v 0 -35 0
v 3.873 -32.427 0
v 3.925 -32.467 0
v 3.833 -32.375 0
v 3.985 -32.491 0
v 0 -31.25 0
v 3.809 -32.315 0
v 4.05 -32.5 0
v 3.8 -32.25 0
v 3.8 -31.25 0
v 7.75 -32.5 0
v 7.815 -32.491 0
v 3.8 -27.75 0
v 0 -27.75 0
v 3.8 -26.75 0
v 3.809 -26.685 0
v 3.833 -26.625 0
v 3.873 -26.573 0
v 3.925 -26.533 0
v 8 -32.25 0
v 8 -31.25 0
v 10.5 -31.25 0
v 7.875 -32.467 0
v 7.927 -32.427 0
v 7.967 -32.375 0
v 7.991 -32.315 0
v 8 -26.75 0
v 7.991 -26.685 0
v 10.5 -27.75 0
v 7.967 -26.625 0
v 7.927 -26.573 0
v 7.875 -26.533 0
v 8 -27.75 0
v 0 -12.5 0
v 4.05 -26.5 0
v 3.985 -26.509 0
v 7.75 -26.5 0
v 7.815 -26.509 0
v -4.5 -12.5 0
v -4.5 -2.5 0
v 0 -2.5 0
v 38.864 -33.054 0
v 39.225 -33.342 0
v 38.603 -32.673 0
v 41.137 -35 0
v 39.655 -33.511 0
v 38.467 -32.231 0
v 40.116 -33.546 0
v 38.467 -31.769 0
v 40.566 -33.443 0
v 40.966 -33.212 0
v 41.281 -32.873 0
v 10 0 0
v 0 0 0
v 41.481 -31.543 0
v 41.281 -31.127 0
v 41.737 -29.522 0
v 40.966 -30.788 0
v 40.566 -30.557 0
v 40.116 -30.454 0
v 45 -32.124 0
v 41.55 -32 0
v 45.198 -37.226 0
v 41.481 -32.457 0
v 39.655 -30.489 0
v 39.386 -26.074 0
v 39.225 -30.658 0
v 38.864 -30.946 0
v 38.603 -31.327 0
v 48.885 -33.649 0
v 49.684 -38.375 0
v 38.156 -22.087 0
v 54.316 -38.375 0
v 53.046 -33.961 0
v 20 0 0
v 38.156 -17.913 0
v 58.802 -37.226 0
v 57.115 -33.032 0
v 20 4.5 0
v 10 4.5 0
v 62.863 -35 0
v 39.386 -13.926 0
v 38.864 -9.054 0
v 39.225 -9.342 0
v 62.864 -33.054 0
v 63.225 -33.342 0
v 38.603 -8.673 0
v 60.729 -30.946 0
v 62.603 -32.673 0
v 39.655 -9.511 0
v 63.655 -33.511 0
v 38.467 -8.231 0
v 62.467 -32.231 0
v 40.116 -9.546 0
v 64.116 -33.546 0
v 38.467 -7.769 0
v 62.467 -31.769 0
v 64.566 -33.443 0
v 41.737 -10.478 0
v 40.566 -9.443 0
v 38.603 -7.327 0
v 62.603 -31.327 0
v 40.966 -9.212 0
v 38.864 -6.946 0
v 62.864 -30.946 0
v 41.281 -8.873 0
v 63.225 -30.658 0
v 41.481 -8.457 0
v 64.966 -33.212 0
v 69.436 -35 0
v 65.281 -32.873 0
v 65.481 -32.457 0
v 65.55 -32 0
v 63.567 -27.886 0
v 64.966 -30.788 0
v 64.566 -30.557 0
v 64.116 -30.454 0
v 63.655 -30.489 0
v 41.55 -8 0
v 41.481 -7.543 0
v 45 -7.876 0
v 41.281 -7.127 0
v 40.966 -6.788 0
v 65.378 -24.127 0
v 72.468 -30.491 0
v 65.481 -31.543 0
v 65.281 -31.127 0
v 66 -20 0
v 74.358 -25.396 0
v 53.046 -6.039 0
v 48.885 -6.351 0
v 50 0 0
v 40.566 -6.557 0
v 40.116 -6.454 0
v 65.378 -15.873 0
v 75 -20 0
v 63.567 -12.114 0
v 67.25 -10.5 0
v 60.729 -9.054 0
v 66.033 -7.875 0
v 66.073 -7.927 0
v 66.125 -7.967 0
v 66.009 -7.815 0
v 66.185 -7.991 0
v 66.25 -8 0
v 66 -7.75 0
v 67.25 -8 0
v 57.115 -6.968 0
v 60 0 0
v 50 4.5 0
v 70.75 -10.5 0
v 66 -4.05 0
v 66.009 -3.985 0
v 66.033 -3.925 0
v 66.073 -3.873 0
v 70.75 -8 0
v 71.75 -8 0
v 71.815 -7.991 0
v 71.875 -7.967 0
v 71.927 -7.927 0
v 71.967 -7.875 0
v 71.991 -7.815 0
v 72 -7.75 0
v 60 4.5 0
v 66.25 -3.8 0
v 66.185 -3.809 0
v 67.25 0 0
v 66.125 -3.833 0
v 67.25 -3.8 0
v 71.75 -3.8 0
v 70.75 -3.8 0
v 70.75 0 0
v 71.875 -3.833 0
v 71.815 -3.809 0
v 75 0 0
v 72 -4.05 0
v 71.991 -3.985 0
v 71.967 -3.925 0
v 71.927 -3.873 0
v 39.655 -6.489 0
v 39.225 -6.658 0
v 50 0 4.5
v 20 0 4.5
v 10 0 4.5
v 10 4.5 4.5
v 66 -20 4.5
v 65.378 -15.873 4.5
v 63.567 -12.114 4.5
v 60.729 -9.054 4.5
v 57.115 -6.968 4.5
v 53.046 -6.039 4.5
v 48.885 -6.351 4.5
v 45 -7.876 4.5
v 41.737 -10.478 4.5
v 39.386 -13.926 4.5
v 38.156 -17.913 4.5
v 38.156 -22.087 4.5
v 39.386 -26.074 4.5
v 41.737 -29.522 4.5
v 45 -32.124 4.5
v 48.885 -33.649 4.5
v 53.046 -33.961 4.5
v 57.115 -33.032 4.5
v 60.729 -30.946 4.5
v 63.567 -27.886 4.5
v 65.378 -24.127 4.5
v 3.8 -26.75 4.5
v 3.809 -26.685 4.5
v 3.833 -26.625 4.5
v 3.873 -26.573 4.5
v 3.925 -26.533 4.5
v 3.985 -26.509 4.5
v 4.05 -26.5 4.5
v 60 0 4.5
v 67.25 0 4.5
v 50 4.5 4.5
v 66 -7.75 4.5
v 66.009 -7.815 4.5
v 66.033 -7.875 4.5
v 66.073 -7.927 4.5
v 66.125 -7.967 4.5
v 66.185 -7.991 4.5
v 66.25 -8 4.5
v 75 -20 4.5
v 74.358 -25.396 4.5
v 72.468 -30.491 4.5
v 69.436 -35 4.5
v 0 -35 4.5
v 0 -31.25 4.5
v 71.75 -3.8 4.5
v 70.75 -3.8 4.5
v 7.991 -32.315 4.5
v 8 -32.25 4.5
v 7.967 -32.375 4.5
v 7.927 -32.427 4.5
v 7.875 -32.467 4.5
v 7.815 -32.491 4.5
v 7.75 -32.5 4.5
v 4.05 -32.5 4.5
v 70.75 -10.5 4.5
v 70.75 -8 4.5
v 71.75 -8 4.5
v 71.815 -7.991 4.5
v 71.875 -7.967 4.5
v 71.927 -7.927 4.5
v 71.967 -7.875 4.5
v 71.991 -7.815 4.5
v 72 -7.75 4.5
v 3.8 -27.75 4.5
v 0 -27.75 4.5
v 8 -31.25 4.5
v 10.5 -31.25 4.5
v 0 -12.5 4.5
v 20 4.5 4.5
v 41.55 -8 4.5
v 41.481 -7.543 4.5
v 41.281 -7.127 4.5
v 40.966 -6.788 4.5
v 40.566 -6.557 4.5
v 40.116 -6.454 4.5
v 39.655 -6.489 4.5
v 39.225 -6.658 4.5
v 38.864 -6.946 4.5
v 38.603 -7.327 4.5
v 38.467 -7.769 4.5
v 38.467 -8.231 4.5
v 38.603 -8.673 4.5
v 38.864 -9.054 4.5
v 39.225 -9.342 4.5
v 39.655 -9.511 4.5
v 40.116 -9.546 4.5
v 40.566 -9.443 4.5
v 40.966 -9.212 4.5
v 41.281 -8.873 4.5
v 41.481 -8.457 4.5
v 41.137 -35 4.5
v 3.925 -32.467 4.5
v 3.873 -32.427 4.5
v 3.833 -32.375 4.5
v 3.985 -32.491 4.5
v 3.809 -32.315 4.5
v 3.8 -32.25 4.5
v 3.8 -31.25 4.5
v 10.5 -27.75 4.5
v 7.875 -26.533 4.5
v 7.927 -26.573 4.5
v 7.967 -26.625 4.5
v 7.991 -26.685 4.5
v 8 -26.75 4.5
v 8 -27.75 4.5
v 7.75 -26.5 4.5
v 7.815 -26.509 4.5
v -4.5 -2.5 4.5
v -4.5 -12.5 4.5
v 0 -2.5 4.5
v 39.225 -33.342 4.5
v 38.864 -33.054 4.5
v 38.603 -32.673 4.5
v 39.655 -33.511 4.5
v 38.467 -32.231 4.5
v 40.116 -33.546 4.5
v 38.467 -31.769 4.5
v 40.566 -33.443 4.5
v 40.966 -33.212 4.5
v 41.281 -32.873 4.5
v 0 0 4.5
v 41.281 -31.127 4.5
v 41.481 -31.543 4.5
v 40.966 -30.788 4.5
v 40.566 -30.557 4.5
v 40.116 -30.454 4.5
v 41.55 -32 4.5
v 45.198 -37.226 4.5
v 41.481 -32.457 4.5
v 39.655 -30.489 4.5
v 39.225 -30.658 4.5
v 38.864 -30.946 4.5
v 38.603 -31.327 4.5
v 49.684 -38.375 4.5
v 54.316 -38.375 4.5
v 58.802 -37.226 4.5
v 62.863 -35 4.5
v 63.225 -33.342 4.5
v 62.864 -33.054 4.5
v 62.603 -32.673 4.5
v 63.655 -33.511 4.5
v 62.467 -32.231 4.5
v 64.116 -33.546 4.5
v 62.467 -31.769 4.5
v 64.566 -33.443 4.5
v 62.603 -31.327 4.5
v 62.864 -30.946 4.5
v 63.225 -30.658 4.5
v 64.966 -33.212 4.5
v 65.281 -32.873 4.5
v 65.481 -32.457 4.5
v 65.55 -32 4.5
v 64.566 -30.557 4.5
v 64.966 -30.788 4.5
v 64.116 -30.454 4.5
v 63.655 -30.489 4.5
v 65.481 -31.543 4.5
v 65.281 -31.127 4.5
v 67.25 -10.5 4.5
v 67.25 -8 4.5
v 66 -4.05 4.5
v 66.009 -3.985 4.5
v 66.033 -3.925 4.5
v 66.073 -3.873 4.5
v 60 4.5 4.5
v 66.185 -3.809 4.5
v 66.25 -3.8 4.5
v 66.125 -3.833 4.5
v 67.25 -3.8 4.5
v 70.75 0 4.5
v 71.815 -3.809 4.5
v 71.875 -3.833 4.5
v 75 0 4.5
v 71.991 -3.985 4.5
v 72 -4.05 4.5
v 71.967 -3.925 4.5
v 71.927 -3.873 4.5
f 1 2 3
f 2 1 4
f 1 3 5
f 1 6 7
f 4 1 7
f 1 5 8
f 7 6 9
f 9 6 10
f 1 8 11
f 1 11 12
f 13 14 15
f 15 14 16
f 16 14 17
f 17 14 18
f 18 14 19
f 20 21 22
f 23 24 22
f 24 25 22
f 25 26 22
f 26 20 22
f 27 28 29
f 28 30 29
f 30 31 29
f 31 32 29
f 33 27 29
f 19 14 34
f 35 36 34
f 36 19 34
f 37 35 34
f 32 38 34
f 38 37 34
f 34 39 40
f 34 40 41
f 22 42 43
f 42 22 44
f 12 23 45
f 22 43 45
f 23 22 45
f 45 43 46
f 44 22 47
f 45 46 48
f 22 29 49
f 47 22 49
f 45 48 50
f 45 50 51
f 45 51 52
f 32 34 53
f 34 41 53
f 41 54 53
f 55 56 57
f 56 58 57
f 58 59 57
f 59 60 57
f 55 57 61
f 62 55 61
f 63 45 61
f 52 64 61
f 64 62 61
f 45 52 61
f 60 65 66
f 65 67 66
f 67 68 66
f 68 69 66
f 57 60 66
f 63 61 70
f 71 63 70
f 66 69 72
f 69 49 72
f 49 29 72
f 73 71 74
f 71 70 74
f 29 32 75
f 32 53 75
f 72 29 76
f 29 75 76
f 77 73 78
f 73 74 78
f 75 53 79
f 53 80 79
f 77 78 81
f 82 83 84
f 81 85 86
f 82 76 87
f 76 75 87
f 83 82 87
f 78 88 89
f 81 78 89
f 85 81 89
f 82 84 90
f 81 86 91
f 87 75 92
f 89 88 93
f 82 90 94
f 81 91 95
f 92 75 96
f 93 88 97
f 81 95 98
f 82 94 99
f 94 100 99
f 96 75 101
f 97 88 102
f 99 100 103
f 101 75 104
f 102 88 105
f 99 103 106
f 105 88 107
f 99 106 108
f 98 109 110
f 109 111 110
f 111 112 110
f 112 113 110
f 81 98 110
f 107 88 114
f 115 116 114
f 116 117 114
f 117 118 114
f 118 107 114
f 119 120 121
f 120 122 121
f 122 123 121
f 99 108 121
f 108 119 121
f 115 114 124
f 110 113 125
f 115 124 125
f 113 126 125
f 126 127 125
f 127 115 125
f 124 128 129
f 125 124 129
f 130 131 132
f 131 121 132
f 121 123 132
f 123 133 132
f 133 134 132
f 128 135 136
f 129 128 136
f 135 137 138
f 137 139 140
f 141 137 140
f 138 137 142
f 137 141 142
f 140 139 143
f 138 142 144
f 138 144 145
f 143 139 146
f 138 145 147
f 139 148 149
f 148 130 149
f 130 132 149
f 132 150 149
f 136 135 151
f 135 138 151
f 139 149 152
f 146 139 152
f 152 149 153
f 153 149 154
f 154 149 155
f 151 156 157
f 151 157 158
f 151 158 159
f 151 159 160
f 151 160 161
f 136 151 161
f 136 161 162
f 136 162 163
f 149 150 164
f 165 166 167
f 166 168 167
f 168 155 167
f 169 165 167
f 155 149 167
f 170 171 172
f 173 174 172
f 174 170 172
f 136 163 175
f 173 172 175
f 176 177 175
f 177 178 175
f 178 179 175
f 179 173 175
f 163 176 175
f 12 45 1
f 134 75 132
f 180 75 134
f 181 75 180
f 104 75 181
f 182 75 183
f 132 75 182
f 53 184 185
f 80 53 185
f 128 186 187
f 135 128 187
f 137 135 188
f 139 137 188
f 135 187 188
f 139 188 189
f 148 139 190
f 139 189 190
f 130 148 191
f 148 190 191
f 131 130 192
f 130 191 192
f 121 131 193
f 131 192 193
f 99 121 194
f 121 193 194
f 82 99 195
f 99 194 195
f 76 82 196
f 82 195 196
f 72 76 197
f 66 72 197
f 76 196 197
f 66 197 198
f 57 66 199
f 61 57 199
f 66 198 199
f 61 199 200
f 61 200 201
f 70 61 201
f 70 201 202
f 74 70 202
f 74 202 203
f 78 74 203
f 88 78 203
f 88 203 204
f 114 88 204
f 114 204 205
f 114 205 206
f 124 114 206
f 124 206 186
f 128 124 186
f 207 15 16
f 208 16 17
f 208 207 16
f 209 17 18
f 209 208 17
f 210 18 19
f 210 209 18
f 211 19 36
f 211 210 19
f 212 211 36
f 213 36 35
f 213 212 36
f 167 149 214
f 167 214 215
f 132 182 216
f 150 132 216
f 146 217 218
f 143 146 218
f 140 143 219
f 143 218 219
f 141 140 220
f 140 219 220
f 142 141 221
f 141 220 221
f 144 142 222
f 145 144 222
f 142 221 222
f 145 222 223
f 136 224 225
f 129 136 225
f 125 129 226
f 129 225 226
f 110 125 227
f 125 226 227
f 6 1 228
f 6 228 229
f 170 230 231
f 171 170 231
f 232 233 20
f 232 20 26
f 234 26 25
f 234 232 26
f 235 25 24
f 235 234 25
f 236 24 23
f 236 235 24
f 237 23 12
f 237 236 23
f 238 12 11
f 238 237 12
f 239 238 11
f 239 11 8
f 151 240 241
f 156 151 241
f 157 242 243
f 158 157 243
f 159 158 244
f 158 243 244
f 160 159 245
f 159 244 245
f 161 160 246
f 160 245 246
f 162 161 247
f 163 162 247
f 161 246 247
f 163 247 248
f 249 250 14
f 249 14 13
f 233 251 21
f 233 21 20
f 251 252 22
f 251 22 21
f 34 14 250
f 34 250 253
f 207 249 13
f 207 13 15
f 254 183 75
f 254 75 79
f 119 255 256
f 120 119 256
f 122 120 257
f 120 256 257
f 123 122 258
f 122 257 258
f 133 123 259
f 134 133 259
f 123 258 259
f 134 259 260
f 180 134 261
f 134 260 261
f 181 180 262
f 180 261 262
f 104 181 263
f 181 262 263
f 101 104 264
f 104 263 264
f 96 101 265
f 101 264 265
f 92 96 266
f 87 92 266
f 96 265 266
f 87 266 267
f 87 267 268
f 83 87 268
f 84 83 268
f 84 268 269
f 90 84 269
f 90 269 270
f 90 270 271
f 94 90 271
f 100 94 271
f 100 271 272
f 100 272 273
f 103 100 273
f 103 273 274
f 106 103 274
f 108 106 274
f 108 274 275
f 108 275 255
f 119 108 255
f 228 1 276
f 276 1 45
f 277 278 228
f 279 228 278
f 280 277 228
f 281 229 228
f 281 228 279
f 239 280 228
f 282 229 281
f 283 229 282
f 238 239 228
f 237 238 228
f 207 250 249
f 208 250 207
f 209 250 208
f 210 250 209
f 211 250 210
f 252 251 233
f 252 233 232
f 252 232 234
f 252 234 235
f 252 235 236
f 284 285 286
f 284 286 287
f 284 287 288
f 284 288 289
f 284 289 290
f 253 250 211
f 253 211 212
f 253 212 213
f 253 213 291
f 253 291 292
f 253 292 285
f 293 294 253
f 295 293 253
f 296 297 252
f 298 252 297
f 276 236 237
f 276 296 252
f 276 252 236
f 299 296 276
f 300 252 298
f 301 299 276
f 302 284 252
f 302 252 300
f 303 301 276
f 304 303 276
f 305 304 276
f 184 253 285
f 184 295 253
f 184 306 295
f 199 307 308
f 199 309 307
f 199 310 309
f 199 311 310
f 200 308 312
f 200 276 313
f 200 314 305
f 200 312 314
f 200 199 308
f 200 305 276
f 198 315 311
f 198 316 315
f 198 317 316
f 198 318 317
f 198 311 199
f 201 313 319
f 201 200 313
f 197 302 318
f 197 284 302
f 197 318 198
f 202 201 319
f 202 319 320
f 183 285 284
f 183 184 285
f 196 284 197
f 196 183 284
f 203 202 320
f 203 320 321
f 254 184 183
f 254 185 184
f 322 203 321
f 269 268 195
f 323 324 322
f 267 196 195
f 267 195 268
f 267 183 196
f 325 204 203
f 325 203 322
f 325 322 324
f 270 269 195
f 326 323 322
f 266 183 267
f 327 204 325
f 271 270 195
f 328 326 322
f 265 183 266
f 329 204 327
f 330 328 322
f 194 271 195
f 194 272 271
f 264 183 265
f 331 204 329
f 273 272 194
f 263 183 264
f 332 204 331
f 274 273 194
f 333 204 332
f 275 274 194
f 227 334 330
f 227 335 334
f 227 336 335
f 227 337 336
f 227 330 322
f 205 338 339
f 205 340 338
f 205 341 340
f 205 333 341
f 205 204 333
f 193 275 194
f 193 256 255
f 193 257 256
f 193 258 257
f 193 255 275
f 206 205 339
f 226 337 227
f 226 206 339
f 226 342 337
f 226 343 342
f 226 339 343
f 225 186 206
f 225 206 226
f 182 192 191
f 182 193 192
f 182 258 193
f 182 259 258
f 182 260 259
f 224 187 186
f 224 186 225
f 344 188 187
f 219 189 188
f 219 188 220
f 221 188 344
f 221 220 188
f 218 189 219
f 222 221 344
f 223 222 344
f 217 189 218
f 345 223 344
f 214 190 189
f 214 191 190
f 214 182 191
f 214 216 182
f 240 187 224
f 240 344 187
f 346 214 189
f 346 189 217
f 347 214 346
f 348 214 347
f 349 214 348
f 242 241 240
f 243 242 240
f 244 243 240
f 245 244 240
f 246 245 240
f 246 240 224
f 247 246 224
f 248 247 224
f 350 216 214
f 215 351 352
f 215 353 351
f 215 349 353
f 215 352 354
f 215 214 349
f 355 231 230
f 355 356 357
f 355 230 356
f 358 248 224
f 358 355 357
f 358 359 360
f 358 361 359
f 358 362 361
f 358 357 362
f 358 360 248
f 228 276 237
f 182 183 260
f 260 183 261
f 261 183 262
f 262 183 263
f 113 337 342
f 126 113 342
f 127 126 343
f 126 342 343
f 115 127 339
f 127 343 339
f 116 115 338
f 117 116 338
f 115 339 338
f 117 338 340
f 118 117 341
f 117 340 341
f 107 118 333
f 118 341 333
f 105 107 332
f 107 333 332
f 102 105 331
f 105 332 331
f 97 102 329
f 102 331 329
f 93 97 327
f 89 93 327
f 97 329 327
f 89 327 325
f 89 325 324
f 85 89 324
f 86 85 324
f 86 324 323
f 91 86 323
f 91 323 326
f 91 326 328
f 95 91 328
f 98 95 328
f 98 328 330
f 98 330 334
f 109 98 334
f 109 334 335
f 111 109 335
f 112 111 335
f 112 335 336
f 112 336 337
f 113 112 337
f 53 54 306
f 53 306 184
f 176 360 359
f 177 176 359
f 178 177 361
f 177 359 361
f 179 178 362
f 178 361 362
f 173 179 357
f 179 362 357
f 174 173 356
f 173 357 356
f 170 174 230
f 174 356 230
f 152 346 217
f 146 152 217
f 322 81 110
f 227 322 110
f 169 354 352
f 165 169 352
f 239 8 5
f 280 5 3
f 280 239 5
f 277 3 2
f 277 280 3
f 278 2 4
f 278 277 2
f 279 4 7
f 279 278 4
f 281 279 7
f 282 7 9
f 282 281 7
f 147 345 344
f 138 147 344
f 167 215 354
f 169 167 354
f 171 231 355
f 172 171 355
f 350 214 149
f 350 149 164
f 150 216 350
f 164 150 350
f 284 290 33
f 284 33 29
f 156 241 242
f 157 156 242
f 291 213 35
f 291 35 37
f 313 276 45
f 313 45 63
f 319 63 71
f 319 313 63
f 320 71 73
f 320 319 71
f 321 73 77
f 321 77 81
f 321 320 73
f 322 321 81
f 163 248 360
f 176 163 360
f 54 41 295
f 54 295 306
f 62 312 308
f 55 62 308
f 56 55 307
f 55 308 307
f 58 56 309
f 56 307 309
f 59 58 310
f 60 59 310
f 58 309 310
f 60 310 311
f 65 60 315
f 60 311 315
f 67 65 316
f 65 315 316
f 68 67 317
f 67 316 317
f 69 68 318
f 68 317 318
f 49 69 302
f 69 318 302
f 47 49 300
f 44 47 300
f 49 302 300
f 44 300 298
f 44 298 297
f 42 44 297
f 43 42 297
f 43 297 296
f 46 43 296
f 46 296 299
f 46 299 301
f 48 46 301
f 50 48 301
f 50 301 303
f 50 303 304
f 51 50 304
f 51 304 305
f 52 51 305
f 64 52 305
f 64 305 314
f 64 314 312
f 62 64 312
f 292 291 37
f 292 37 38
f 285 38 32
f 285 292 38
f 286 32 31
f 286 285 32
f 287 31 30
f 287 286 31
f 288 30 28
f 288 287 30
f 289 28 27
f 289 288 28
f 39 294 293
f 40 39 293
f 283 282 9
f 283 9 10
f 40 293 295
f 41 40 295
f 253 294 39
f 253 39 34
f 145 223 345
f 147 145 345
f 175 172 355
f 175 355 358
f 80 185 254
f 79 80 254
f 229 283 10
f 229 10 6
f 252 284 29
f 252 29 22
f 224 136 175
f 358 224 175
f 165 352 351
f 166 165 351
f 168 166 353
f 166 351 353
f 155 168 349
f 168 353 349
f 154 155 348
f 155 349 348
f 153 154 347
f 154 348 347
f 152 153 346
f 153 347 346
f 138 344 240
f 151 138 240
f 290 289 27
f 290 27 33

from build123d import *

# Parameters (mm, degrees)
SKETCH1_W           = 75
SKETCH1_H           = 35
MAINSHAPE_DEPTH     = 4.5
SKETCH2_W           = 4.5
SKETCH2_H           = 10
REARTAB_DEPTH       = 4.5
SKETCH3_W           = 10
SKETCH3_H           = 4.5
BOSS_EXTRUDE3_DEPTH = 4.5
CUT_EXTRUDE1_DEPTH  = 83.886971232
SKETCH6_R           = 14
SKETCH6_R_2         = 1.55
CUT_EXTRUDE3_DEPTH  = 83.886971232
BOSS_EXTRUDE4_DEPTH = 4.5
CUT_EXTRUDE7_DEPTH  = 85.433901689
SMOOTHEDGE_DEPTH    = 85.433901689


with BuildPart() as part:
    # Sketch1 → MainShape (new body)
    with BuildSketch(Plane.XY):
        with Locations((37.5, -17.5)):
            Rectangle(SKETCH1_W, SKETCH1_H)
    extrude(amount=MAINSHAPE_DEPTH)

    # Sketch2 → RearTab (add, through all)
    with BuildSketch(Plane.XY.offset(4.5)):
        with Locations((-2.25, -7.5)):
            Rectangle(SKETCH2_W, SKETCH2_H)
    extrude(amount=-REARTAB_DEPTH)

    # Sketch3 → Boss-Extrude3 (add, through all)
    with BuildSketch(Plane.XY.offset(4.5)):
        with Locations((15, 2.25)):
            Rectangle(SKETCH3_W, SKETCH3_H)
        with Locations((55, 2.25)):
            Rectangle(SKETCH3_W, SKETCH3_H)
    extrude(amount=-BOSS_EXTRUDE3_DEPTH)

    # Sketch4 → Cut-Extrude1 (cut, through all)
    with BuildSketch(Plane.XY.offset(4.5)):
        with BuildLine():
            Line((67.25, 0), (67.25, -3.8))
            Line((67.25, -3.8), (66.25, -3.8))
            ThreePointArc((66.25, -3.8), (66.073223305, -3.873223305), (66, -4.05))
            Line((66, -4.05), (66, -7.75))
            ThreePointArc((66, -7.75), (66.073223305, -7.926776695), (66.25, -8))
            Line((66.25, -8), (67.25, -8))
            Line((67.25, -8), (67.25, -10.5))
            Line((67.25, -10.5), (70.75, -10.5))
            Line((70.75, -10.5), (70.75, -8))
            Line((70.75, -8), (71.75, -8))
            ThreePointArc((71.75, -8), (71.926776695, -7.926776695), (72, -7.75))
            Line((72, -7.75), (72, -4.05))
            ThreePointArc((72, -4.05), (71.926776695, -3.873223305), (71.75, -3.8))
            Line((71.75, -3.8), (70.75, -3.8))
            Line((70.75, -3.8), (70.75, 0))
            Line((70.75, 0), (67.25, 0))
        make_face()
    extrude(amount=-CUT_EXTRUDE1_DEPTH, mode=Mode.SUBTRACT)

    # Sketch6 → Cut-Extrude3 (cut, through all)
    with BuildSketch(Plane.XY.offset(4.5)):
        with Locations((52, -20)):
            Circle(SKETCH6_R)
        with Locations((40, -8)):
            Circle(SKETCH6_R_2)
        with Locations((64, -32)):
            Circle(SKETCH6_R_2)
        with Locations((40, -32)):
            Circle(SKETCH6_R_2)
    extrude(amount=-CUT_EXTRUDE3_DEPTH, mode=Mode.SUBTRACT)

    # Sketch7 → Boss-Extrude4 (add, through all)
    with BuildSketch(Plane.XY.offset(4.5)):
        with BuildLine():
            Line((62.86329805, -35), (41.13670195, -35))
            ThreePointArc((41.13670195, -35), (52, -38.520562748), (62.86329805, -35))
        make_face()
    extrude(amount=-BOSS_EXTRUDE4_DEPTH)

    # Sketch11 → Cut-Extrude7 (cut, through all)
    with BuildSketch(Plane.XY.offset(4.5)):
        with BuildLine():
            Line((0, -31.25), (0, -27.75))
            Line((0, -27.75), (3.8, -27.75))
            Line((3.8, -27.75), (3.8, -26.75))
            ThreePointArc((3.8, -26.75), (3.873223305, -26.573223305), (4.05, -26.5))
            Line((4.05, -26.5), (7.75, -26.5))
            ThreePointArc((7.75, -26.5), (7.926776695, -26.573223305), (8, -26.75))
            Line((8, -26.75), (8, -27.75))
            Line((8, -27.75), (10.5, -27.75))
            Line((10.5, -27.75), (10.5, -31.25))
            Line((10.5, -31.25), (8, -31.25))
            Line((8, -31.25), (8, -32.25))
            ThreePointArc((8, -32.25), (7.926776695, -32.426776695), (7.75, -32.5))
            Line((7.75, -32.5), (4.05, -32.5))
            ThreePointArc((4.05, -32.5), (3.873223305, -32.426776695), (3.8, -32.25))
            Line((3.8, -32.25), (3.8, -31.25))
            Line((3.8, -31.25), (0, -31.25))
        make_face()
    extrude(amount=-CUT_EXTRUDE7_DEPTH, mode=Mode.SUBTRACT)

    # Sketch14 → SmoothEdge (cut, through all)
    with BuildSketch(Plane.XY.offset(4.5)):
        with BuildLine():
            Line((69.435595774, -35), (75, -35))
            Line((75, -35), (75, -20))
            ThreePointArc((75, -20), (73.564075482, -27.999415516), (69.435595774, -35))
        make_face()
    extrude(amount=-SMOOTHEDGE_DEPTH, mode=Mode.SUBTRACT)


solid = part.part
